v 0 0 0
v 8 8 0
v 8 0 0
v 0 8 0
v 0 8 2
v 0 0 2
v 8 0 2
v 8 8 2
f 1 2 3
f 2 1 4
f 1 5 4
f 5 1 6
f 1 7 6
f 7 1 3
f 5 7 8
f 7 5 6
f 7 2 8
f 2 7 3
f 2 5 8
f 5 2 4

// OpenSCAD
union() {
    translate([0, 0, 0]) cube([1, 1, 1]);
    translate([0, 0, 1]) cube([1, 1, 1]);
    translate([0, 1, 0]) cube([1, 1, 1]);
    translate([0, 1, 1]) cube([1, 1, 1]);
    translate([1, 0, 0]) cube([1, 1, 1]);
    translate([1, 0, 1]) cube([1, 1, 1]);
    translate([1, 1, 0]) cube([1, 1, 1]);
    translate([1, 1, 1]) cube([1, 1, 1]);
    translate([2, 0, 0]) cube([1, 1, 1]);
    translate([2, 0, 1]) cube([1, 1, 1]);
    translate([2, 1, 0]) cube([1, 1, 1]);
    translate([2, 1, 1]) cube([1, 1, 1]);
    translate([3, 0, 0]) cube([1, 1, 1]);
    translate([3, 0, 1]) cube([1, 1, 1]);
    translate([3, 1, 0]) cube([1, 1, 1]);
    translate([3, 1, 1]) cube([1, 1, 1]);
    translate([4, 0, 0]) cube([1, 1, 1]);
    translate([4, 0, 1]) cube([1, 1, 1]);
    translate([4, 1, 0]) cube([1, 1, 1]);
    translate([4, 1, 1]) cube([1, 1, 1]);
    translate([5, 0, 0]) cube([1, 1, 1]);
    translate([5, 0, 1]) cube([1, 1, 1]);
    translate([5, 1, 0]) cube([1, 1, 1]);
    translate([5, 1, 1]) cube([1, 1, 1]);
    translate([6, 0, 0]) cube([1, 1, 1]);
    translate([6, 0, 1]) cube([1, 1, 1]);
    translate([6, 1, 0]) cube([1, 1, 1]);
    translate([6, 1, 1]) cube([1, 1, 1]);
    translate([7, 0, 0]) cube([1, 1, 1]);
    translate([7, 0, 1]) cube([1, 1, 1]);
    translate([7, 1, 0]) cube([1, 1, 1]);
    translate([7, 1, 1]) cube([1, 1, 1]);
    translate([0, 2, 0]) cube([1, 1, 1]);
    translate([0, 2, 1]) cube([1, 1, 1]);
    translate([1, 2, 0]) cube([1, 1, 1]);
    translate([1, 2, 1]) cube([1, 1, 1]);
    translate([2, 2, 0]) cube([1, 1, 1]);
    translate([2, 2, 1]) cube([1, 1, 1]);
    translate([3, 2, 0]) cube([1, 1, 1]);
    translate([3, 2, 1]) cube([1, 1, 1]);
    translate([4, 2, 0]) cube([1, 1, 1]);
    translate([4, 2, 1]) cube([1, 1, 1]);
    translate([5, 2, 0]) cube([1, 1, 1]);
    translate([5, 2, 1]) cube([1, 1, 1]);
    translate([6, 2, 0]) cube([1, 1, 1]);
    translate([6, 2, 1]) cube([1, 1, 1]);
    translate([7, 2, 0]) cube([1, 1, 1]);
    translate([7, 2, 1]) cube([1, 1, 1]);
    translate([0, 3, 0]) cube([1, 1, 1]);
    translate([0, 3, 1]) cube([1, 1, 1]);
    translate([1, 3, 0]) cube([1, 1, 1]);
    translate([1, 3, 1]) cube([1, 1, 1]);
    translate([2, 3, 0]) cube([1, 1, 1]);
    translate([2, 3, 1]) cube([1, 1, 1]);
    translate([3, 3, 0]) cube([1, 1, 1]);
    translate([3, 3, 1]) cube([1, 1, 1]);
    translate([4, 3, 0]) cube([1, 1, 1]);
    translate([4, 3, 1]) cube([1, 1, 1]);
    translate([5, 3, 0]) cube([1, 1, 1]);
    translate([5, 3, 1]) cube([1, 1, 1]);
    translate([6, 3, 0]) cube([1, 1, 1]);
    translate([6, 3, 1]) cube([1, 1, 1]);
    translate([7, 3, 0]) cube([1, 1, 1]);
    translate([7, 3, 1]) cube([1, 1, 1]);
    translate([0, 4, 0]) cube([1, 1, 1]);
    translate([0, 4, 1]) cube([1, 1, 1]);
    translate([1, 4, 0]) cube([1, 1, 1]);
    translate([1, 4, 1]) cube([1, 1, 1]);
    translate([2, 4, 0]) cube([1, 1, 1]);
    translate([2, 4, 1]) cube([1, 1, 1]);
    translate([3, 4, 0]) cube([1, 1, 1]);
    translate([3, 4, 1]) cube([1, 1, 1]);
    translate([4, 4, 0]) cube([1, 1, 1]);
    translate([4, 4, 1]) cube([1, 1, 1]);
    translate([5, 4, 0]) cube([1, 1, 1]);
    translate([5, 4, 1]) cube([1, 1, 1]);
    translate([6, 4, 0]) cube([1, 1, 1]);
    translate([6, 4, 1]) cube([1, 1, 1]);
    translate([7, 4, 0]) cube([1, 1, 1]);
    translate([7, 4, 1]) cube([1, 1, 1]);
    translate([0, 5, 0]) cube([1, 1, 1]);
    translate([0, 5, 1]) cube([1, 1, 1]);
    translate([1, 5, 0]) cube([1, 1, 1]);
    translate([1, 5, 1]) cube([1, 1, 1]);
    translate([2, 5, 0]) cube([1, 1, 1]);
    translate([2, 5, 1]) cube([1, 1, 1]);
    translate([3, 5, 0]) cube([1, 1, 1]);
    translate([3, 5, 1]) cube([1, 1, 1]);
    translate([4, 5, 0]) cube([1, 1, 1]);
    translate([4, 5, 1]) cube([1, 1, 1]);
    translate([5, 5, 0]) cube([1, 1, 1]);
    translate([5, 5, 1]) cube([1, 1, 1]);
    translate([6, 5, 0]) cube([1, 1, 1]);
    translate([6, 5, 1]) cube([1, 1, 1]);
    translate([7, 5, 0]) cube([1, 1, 1]);
    translate([7, 5, 1]) cube([1, 1, 1]);
    translate([0, 6, 0]) cube([1, 1, 1]);
    translate([0, 6, 1]) cube([1, 1, 1]);
    translate([1, 6, 0]) cube([1, 1, 1]);
    translate([1, 6, 1]) cube([1, 1, 1]);
    translate([2, 6, 0]) cube([1, 1, 1]);
    translate([2, 6, 1]) cube([1, 1, 1]);
    translate([3, 6, 0]) cube([1, 1, 1]);
    translate([3, 6, 1]) cube([1, 1, 1]);
    translate([4, 6, 0]) cube([1, 1, 1]);
    translate([4, 6, 1]) cube([1, 1, 1]);
    translate([5, 6, 0]) cube([1, 1, 1]);
    translate([5, 6, 1]) cube([1, 1, 1]);
    translate([6, 6, 0]) cube([1, 1, 1]);
    translate([6, 6, 1]) cube([1, 1, 1]);
    translate([7, 6, 0]) cube([1, 1, 1]);
    translate([7, 6, 1]) cube([1, 1, 1]);
    translate([0, 7, 0]) cube([1, 1, 1]);
    translate([0, 7, 1]) cube([1, 1, 1]);
    translate([1, 7, 0]) cube([1, 1, 1]);
    translate([1, 7, 1]) cube([1, 1, 1]);
    translate([2, 7, 0]) cube([1, 1, 1]);
    translate([2, 7, 1]) cube([1, 1, 1]);
    translate([3, 7, 0]) cube([1, 1, 1]);
    translate([3, 7, 1]) cube([1, 1, 1]);
    translate([4, 7, 0]) cube([1, 1, 1]);
    translate([4, 7, 1]) cube([1, 1, 1]);
    translate([5, 7, 0]) cube([1, 1, 1]);
    translate([5, 7, 1]) cube([1, 1, 1]);
    translate([6, 7, 0]) cube([1, 1, 1]);
    translate([6, 7, 1]) cube([1, 1, 1]);
    translate([7, 7, 0]) cube([1, 1, 1]);
    translate([7, 7, 1]) cube([1, 1, 1]);
}
